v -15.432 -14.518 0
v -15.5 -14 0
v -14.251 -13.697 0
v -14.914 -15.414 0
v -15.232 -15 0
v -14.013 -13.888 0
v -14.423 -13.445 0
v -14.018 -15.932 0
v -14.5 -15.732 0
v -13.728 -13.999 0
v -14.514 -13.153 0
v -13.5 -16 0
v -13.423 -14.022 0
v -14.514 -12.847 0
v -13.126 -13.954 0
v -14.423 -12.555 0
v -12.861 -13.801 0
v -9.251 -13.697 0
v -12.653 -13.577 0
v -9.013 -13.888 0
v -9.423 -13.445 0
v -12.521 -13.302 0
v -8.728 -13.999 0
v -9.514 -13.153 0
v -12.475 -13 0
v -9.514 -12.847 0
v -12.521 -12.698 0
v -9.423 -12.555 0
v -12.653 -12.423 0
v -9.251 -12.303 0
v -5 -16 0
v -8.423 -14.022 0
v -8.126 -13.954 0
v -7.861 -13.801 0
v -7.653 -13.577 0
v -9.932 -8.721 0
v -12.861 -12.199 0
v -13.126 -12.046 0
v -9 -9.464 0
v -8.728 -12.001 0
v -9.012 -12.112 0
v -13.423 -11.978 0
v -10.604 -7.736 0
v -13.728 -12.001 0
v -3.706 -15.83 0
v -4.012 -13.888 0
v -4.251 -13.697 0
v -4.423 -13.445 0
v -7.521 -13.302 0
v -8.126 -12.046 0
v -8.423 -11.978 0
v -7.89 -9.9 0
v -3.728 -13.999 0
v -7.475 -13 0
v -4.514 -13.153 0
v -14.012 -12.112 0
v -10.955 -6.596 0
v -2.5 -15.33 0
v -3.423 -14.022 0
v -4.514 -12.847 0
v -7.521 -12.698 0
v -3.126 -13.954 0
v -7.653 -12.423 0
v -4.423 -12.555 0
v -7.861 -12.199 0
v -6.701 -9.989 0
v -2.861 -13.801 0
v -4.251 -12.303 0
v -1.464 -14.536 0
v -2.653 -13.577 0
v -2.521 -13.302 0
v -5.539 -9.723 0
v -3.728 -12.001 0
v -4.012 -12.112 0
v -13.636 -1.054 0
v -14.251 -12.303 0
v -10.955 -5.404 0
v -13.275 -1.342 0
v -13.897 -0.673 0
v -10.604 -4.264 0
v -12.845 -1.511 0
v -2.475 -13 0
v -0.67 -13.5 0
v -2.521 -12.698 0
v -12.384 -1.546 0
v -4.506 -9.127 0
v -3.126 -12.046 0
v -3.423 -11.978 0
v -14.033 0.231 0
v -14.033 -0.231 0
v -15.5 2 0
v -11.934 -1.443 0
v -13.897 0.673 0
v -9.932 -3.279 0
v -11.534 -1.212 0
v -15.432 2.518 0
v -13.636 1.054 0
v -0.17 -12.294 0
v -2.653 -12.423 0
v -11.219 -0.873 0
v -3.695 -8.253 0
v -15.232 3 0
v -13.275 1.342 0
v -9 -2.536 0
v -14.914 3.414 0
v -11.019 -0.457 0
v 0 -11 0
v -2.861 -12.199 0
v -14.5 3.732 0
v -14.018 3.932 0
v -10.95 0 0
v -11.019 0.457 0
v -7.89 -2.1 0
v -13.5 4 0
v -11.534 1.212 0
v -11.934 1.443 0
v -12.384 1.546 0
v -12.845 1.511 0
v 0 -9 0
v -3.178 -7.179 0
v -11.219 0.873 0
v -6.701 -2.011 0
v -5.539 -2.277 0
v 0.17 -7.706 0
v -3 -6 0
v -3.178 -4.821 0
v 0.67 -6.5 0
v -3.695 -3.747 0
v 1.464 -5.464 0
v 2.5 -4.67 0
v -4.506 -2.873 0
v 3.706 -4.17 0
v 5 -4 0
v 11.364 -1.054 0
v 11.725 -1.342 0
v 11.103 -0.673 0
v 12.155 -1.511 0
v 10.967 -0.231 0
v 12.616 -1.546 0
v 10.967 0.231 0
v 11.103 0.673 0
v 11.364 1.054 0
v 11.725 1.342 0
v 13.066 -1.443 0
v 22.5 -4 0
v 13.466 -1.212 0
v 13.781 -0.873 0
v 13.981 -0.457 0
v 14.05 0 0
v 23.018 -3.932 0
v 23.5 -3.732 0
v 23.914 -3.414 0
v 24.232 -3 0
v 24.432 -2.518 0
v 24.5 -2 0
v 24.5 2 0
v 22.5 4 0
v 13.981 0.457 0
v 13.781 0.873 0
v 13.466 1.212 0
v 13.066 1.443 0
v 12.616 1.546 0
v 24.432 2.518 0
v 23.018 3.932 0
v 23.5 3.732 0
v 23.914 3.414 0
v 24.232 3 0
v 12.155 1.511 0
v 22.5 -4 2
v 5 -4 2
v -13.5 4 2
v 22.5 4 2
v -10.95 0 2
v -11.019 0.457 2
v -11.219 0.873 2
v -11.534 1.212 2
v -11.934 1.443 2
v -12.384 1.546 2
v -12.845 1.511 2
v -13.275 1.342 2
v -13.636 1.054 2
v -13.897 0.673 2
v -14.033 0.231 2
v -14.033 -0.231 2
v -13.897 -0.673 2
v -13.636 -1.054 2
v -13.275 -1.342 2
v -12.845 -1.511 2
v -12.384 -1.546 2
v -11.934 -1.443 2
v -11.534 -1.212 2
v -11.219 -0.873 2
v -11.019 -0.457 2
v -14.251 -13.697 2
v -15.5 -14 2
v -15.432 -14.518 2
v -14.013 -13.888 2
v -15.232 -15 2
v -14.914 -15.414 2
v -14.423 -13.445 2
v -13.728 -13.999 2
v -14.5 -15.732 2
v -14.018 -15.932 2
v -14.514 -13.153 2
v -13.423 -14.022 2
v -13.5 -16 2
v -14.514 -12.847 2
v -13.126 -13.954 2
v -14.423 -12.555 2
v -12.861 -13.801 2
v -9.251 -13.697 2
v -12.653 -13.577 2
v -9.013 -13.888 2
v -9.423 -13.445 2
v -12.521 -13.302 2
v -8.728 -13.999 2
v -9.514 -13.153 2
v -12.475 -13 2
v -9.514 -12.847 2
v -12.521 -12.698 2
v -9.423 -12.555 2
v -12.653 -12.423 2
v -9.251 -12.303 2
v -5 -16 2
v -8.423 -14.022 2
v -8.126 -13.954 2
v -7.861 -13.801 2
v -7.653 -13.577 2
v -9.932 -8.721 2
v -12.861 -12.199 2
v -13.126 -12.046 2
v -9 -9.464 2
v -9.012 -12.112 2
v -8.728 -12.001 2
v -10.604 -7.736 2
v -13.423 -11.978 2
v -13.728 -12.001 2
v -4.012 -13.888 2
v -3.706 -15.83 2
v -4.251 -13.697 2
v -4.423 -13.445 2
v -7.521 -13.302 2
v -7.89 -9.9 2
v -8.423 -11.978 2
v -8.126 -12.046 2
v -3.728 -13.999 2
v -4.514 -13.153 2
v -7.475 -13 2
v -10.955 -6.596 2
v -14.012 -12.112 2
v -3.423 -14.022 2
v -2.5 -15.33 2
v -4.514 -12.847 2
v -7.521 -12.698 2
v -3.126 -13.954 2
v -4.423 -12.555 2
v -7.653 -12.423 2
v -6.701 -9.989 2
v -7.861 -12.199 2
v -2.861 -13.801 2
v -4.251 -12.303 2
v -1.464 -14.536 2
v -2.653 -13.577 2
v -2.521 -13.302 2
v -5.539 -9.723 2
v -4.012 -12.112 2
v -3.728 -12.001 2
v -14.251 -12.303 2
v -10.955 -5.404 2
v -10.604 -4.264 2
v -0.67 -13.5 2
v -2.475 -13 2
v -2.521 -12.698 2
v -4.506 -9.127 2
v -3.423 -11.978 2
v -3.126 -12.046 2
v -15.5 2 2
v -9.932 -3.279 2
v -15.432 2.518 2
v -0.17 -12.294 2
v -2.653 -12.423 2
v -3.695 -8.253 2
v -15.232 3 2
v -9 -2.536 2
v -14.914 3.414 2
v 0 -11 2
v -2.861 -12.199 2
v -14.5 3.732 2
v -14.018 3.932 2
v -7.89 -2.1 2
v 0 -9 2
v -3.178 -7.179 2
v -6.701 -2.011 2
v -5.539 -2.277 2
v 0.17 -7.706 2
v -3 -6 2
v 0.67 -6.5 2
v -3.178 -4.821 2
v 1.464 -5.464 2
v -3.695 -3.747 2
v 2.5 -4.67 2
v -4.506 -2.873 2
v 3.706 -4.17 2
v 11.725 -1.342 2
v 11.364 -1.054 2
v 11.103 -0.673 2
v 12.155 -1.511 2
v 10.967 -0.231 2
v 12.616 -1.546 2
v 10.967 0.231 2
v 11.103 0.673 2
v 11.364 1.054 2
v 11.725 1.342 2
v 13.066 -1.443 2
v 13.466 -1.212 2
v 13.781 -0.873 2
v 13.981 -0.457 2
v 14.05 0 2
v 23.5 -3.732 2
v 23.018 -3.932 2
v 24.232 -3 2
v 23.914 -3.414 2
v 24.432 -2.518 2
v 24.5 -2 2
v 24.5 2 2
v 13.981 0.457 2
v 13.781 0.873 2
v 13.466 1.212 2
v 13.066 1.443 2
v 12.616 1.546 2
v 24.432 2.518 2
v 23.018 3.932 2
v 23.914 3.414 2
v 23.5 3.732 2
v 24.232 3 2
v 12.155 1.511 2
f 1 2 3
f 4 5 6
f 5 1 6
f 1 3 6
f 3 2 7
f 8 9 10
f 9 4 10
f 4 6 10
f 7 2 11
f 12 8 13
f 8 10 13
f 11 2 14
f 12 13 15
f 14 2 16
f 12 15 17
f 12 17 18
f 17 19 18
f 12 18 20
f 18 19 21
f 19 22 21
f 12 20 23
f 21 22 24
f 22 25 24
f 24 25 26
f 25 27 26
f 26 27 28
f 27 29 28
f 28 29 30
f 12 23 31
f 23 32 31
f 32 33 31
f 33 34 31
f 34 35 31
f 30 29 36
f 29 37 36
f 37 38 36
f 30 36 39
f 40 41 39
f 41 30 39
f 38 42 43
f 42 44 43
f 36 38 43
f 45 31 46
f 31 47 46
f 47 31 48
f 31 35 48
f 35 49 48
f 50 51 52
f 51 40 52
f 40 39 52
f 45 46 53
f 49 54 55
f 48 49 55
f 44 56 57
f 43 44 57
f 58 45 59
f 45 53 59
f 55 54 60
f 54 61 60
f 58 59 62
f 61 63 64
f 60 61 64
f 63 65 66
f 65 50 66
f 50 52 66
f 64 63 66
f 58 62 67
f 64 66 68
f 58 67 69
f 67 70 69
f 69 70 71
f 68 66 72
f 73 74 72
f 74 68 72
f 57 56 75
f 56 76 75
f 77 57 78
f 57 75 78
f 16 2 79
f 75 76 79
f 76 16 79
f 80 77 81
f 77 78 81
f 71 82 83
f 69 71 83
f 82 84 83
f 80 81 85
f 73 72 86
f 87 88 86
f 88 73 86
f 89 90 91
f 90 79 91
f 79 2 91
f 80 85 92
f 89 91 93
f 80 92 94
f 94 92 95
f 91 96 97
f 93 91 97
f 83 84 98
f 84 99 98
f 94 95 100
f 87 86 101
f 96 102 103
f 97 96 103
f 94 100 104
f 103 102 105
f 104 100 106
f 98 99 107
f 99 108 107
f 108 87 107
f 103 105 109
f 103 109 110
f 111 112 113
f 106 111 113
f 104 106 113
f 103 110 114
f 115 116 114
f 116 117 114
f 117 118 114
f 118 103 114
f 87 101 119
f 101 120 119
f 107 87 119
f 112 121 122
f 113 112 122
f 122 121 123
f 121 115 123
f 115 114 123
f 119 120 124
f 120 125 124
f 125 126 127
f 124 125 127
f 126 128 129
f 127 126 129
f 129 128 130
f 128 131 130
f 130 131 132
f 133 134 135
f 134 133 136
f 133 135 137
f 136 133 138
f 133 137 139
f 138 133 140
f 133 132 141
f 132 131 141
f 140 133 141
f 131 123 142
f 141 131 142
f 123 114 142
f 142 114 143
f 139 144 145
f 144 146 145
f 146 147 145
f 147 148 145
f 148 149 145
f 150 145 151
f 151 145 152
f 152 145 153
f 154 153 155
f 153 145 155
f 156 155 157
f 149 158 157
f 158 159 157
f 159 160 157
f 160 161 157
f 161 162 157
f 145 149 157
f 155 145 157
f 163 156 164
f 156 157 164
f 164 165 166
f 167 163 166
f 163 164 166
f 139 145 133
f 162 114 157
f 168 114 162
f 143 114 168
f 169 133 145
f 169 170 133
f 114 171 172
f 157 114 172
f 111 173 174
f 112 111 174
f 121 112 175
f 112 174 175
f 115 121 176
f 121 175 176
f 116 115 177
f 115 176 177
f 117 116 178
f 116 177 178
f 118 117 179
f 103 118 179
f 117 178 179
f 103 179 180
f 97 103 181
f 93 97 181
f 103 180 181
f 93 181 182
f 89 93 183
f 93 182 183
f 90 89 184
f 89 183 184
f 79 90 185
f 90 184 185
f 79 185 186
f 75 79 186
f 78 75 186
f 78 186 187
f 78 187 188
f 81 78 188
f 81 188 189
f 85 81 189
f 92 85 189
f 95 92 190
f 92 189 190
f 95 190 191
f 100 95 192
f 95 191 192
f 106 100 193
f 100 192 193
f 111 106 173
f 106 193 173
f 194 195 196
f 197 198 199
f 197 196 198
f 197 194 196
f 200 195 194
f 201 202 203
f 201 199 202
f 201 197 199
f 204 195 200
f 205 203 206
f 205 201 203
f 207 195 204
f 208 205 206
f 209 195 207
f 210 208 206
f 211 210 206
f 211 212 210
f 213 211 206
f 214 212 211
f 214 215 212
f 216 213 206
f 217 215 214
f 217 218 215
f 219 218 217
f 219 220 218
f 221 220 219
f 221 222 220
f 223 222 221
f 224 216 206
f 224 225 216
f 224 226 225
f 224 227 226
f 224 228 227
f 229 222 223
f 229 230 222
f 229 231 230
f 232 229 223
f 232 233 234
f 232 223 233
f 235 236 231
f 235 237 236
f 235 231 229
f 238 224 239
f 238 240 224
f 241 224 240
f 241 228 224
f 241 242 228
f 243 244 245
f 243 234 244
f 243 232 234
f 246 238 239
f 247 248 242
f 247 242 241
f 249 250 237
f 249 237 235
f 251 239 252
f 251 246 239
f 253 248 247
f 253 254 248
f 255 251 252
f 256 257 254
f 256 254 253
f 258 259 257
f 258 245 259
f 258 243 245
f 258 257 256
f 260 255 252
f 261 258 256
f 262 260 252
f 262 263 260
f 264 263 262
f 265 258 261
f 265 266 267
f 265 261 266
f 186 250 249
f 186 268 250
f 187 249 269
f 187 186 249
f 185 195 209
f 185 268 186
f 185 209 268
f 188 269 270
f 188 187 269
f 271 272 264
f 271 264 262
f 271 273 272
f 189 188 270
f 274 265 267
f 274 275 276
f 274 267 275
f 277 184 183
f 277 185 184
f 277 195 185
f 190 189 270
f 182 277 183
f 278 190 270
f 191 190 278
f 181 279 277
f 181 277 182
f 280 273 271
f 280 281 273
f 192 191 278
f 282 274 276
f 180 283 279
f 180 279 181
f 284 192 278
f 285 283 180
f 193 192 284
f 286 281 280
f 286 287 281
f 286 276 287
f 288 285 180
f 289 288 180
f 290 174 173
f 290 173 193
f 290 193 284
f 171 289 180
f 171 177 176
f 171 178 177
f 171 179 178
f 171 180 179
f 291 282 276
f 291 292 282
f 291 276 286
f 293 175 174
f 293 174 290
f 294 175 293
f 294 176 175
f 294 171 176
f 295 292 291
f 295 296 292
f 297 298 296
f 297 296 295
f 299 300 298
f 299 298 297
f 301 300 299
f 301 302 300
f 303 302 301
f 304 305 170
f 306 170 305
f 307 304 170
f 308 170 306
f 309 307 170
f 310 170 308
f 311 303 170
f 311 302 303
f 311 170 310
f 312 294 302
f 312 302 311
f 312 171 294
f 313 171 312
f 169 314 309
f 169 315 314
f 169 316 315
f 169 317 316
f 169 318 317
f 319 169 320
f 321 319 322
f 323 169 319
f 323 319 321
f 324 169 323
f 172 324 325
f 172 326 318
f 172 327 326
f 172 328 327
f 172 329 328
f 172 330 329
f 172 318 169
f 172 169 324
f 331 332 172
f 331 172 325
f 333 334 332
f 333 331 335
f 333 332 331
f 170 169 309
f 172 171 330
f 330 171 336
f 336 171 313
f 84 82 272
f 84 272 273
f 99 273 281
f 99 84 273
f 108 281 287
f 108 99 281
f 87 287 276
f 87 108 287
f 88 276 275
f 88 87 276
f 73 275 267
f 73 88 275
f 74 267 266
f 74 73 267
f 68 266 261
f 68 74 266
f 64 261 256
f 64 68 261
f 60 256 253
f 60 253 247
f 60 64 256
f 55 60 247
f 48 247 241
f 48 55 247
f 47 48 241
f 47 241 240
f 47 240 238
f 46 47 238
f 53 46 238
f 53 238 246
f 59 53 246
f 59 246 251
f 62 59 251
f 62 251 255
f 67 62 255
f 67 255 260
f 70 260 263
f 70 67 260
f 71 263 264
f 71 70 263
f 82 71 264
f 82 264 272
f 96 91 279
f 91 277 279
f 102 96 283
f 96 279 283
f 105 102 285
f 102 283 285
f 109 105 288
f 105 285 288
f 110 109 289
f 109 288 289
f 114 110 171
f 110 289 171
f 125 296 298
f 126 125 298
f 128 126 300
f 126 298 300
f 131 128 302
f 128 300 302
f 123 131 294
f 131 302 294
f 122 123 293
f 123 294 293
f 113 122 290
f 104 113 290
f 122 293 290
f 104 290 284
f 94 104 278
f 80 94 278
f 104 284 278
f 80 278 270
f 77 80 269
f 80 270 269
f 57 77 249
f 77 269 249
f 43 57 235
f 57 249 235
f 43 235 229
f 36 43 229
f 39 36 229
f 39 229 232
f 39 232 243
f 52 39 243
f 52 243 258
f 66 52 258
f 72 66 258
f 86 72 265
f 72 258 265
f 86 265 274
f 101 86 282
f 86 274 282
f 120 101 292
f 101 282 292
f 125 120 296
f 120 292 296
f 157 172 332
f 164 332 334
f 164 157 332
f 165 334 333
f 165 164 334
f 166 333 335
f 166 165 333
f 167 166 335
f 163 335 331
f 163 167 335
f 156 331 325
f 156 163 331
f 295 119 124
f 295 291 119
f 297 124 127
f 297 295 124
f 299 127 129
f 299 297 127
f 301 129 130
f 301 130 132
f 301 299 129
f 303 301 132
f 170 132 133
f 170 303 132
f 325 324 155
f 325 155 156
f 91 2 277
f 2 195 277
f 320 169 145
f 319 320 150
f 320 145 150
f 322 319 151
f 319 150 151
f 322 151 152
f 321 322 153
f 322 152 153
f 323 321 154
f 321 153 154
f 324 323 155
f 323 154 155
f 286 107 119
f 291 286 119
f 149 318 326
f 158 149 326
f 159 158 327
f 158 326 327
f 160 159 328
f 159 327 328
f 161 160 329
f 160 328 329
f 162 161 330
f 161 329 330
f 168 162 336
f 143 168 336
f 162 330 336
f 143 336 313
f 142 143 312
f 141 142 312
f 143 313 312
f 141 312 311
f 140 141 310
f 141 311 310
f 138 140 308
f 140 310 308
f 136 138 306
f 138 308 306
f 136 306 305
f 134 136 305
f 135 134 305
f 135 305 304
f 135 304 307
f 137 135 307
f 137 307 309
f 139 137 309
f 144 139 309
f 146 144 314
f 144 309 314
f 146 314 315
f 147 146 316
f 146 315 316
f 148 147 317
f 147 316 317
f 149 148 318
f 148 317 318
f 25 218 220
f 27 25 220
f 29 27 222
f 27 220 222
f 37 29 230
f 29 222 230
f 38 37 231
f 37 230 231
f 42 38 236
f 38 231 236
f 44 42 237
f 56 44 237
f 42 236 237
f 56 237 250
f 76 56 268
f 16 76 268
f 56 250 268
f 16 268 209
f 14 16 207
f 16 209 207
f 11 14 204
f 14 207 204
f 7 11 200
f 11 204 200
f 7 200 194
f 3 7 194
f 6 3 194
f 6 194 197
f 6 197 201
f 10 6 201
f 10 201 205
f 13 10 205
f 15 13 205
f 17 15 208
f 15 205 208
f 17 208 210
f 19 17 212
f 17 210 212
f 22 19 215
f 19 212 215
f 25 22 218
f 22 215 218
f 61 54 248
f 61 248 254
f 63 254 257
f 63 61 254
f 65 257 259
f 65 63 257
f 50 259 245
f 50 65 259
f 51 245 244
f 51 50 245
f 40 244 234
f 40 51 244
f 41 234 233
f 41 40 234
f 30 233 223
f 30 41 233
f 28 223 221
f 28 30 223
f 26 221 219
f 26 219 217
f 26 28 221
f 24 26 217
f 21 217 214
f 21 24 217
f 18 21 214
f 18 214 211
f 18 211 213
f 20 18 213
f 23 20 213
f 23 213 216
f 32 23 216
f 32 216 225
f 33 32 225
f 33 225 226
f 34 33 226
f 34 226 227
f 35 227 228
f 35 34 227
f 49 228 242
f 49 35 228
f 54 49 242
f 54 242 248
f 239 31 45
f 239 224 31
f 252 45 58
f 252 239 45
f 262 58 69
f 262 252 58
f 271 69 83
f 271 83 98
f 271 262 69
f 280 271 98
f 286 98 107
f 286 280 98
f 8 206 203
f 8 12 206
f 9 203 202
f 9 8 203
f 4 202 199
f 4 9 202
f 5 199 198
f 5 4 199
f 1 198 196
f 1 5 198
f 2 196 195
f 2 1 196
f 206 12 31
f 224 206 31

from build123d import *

# Parameters (mm, degrees)
SKETCH_2_W          = 31
SKETCH_2_H          = 8
EXTRUDE_1_DEPTH     = 2
SKETCH_3_R          = 1.55
CUT_EXTRUDE_1_DEPTH = 2
SKETCH_4_W          = 4
SKETCH_4_H          = 12
EXTRUDE_2_DEPTH     = 2
SKETCH_5_R          = 1.025
CUT_EXTRUDE_2_DEPTH = 2
SKETCH_6_W          = 9
SKETCH_6_H          = 8
EXTRUDE_3_DEPTH     = 2
FILLET_1_R          = 2
EXTRUDE_START       = -2
EXTRUDE_4_OUTLINE_R = 1.025
EXTRUDE_4_DEPTH     = 2
FILLET_2_R          = 5
SKETCH_8_R          = 4
CUT_EXTRUDE_3_DEPTH = 2


# Read off the part's stored shape, not the designer's step: 凸台-拉伸4
with BuildPart() as part:
    # 草图2 → 凸台-拉伸1 (new body)
    with BuildSketch(Plane.XY):
        Rectangle(SKETCH_2_W, SKETCH_2_H)
    extrude(amount=EXTRUDE_1_DEPTH)

    # 草图3 → 切除-拉伸1 (cut)
    with BuildSketch(Plane.XY.offset(2)):
        with Locations((12.5, 0)):
            Circle(SKETCH_3_R)
        with Locations((-12.5, 0)):
            Circle(SKETCH_3_R)
    extrude(amount=-CUT_EXTRUDE_1_DEPTH, mode=Mode.SUBTRACT)

    # 草图4 → 凸台-拉伸2 (add)
    with BuildSketch(Plane.XY.offset(2)):
        with Locations((-13.5, -10)):
            Rectangle(SKETCH_4_W, SKETCH_4_H)
    extrude(amount=-EXTRUDE_2_DEPTH)

    # 草图5 → 切除-拉伸2 (cut)
    with BuildSketch(Plane.XY.offset(2)):
        with Locations((-13.5, -13)):
            Circle(SKETCH_5_R)
    extrude(amount=-CUT_EXTRUDE_2_DEPTH, mode=Mode.SUBTRACT)

    # 草图6 → 凸台-拉伸3 (add)
    with BuildSketch(Plane.XY.offset(2)):
        with Locations((20, 0)):
            Rectangle(SKETCH_6_W, SKETCH_6_H)
    extrude(amount=-EXTRUDE_3_DEPTH)

    # 圆角1
    fillet_1_edges = [part.edges().sort_by_distance(p)[0] for p in [
        (-15.5, -16, 1),
        (-11.5, -16, 1),
        (-11.5, -4, 1),
        (-15.5, 4, 1),
        (24.5, -4, 1),
        (24.5, 4, 1),
    ]]
    fillet(fillet_1_edges, radius=FILLET_1_R - 0.0001)  # a hair under: the kernel refuses the full size

    # 凸台-拉伸4 outline → 凸台-拉伸4 (add)
    with BuildSketch(Plane.XY.offset(2).offset(EXTRUDE_START)):
        with BuildLine():
            Line((-13.5, -16), (0, -16))
            Line((0, -16), (0, -4))
            Line((0, -4), (-11.499999994, -4))
            Line((-11.499999994, -4), (-11.5, -14))
            ThreePointArc((-11.5, -14), (-12.085786438, -15.414213562), (-13.5, -16))
        make_face()
        with Locations((-8.5, -13)):
            Circle(EXTRUDE_4_OUTLINE_R, mode=Mode.SUBTRACT)
        with Locations((-3.5, -13)):
            Circle(EXTRUDE_4_OUTLINE_R, mode=Mode.SUBTRACT)
    extrude(amount=EXTRUDE_4_DEPTH)

    # 圆角2
    fillet_2_edges = [part.edges().sort_by_distance(p)[0] for p in [
        (0, -4, 1),
        (0, -16, 1),
    ]]
    fillet(fillet_2_edges, radius=FILLET_2_R)

    # 草图8 → 切除-拉伸3 (cut)
    with BuildSketch(Plane.XY.offset(2)):
        with Locations((-7, -6)):
            Circle(SKETCH_8_R)
    extrude(amount=-CUT_EXTRUDE_3_DEPTH, mode=Mode.SUBTRACT)


solid = part.part
